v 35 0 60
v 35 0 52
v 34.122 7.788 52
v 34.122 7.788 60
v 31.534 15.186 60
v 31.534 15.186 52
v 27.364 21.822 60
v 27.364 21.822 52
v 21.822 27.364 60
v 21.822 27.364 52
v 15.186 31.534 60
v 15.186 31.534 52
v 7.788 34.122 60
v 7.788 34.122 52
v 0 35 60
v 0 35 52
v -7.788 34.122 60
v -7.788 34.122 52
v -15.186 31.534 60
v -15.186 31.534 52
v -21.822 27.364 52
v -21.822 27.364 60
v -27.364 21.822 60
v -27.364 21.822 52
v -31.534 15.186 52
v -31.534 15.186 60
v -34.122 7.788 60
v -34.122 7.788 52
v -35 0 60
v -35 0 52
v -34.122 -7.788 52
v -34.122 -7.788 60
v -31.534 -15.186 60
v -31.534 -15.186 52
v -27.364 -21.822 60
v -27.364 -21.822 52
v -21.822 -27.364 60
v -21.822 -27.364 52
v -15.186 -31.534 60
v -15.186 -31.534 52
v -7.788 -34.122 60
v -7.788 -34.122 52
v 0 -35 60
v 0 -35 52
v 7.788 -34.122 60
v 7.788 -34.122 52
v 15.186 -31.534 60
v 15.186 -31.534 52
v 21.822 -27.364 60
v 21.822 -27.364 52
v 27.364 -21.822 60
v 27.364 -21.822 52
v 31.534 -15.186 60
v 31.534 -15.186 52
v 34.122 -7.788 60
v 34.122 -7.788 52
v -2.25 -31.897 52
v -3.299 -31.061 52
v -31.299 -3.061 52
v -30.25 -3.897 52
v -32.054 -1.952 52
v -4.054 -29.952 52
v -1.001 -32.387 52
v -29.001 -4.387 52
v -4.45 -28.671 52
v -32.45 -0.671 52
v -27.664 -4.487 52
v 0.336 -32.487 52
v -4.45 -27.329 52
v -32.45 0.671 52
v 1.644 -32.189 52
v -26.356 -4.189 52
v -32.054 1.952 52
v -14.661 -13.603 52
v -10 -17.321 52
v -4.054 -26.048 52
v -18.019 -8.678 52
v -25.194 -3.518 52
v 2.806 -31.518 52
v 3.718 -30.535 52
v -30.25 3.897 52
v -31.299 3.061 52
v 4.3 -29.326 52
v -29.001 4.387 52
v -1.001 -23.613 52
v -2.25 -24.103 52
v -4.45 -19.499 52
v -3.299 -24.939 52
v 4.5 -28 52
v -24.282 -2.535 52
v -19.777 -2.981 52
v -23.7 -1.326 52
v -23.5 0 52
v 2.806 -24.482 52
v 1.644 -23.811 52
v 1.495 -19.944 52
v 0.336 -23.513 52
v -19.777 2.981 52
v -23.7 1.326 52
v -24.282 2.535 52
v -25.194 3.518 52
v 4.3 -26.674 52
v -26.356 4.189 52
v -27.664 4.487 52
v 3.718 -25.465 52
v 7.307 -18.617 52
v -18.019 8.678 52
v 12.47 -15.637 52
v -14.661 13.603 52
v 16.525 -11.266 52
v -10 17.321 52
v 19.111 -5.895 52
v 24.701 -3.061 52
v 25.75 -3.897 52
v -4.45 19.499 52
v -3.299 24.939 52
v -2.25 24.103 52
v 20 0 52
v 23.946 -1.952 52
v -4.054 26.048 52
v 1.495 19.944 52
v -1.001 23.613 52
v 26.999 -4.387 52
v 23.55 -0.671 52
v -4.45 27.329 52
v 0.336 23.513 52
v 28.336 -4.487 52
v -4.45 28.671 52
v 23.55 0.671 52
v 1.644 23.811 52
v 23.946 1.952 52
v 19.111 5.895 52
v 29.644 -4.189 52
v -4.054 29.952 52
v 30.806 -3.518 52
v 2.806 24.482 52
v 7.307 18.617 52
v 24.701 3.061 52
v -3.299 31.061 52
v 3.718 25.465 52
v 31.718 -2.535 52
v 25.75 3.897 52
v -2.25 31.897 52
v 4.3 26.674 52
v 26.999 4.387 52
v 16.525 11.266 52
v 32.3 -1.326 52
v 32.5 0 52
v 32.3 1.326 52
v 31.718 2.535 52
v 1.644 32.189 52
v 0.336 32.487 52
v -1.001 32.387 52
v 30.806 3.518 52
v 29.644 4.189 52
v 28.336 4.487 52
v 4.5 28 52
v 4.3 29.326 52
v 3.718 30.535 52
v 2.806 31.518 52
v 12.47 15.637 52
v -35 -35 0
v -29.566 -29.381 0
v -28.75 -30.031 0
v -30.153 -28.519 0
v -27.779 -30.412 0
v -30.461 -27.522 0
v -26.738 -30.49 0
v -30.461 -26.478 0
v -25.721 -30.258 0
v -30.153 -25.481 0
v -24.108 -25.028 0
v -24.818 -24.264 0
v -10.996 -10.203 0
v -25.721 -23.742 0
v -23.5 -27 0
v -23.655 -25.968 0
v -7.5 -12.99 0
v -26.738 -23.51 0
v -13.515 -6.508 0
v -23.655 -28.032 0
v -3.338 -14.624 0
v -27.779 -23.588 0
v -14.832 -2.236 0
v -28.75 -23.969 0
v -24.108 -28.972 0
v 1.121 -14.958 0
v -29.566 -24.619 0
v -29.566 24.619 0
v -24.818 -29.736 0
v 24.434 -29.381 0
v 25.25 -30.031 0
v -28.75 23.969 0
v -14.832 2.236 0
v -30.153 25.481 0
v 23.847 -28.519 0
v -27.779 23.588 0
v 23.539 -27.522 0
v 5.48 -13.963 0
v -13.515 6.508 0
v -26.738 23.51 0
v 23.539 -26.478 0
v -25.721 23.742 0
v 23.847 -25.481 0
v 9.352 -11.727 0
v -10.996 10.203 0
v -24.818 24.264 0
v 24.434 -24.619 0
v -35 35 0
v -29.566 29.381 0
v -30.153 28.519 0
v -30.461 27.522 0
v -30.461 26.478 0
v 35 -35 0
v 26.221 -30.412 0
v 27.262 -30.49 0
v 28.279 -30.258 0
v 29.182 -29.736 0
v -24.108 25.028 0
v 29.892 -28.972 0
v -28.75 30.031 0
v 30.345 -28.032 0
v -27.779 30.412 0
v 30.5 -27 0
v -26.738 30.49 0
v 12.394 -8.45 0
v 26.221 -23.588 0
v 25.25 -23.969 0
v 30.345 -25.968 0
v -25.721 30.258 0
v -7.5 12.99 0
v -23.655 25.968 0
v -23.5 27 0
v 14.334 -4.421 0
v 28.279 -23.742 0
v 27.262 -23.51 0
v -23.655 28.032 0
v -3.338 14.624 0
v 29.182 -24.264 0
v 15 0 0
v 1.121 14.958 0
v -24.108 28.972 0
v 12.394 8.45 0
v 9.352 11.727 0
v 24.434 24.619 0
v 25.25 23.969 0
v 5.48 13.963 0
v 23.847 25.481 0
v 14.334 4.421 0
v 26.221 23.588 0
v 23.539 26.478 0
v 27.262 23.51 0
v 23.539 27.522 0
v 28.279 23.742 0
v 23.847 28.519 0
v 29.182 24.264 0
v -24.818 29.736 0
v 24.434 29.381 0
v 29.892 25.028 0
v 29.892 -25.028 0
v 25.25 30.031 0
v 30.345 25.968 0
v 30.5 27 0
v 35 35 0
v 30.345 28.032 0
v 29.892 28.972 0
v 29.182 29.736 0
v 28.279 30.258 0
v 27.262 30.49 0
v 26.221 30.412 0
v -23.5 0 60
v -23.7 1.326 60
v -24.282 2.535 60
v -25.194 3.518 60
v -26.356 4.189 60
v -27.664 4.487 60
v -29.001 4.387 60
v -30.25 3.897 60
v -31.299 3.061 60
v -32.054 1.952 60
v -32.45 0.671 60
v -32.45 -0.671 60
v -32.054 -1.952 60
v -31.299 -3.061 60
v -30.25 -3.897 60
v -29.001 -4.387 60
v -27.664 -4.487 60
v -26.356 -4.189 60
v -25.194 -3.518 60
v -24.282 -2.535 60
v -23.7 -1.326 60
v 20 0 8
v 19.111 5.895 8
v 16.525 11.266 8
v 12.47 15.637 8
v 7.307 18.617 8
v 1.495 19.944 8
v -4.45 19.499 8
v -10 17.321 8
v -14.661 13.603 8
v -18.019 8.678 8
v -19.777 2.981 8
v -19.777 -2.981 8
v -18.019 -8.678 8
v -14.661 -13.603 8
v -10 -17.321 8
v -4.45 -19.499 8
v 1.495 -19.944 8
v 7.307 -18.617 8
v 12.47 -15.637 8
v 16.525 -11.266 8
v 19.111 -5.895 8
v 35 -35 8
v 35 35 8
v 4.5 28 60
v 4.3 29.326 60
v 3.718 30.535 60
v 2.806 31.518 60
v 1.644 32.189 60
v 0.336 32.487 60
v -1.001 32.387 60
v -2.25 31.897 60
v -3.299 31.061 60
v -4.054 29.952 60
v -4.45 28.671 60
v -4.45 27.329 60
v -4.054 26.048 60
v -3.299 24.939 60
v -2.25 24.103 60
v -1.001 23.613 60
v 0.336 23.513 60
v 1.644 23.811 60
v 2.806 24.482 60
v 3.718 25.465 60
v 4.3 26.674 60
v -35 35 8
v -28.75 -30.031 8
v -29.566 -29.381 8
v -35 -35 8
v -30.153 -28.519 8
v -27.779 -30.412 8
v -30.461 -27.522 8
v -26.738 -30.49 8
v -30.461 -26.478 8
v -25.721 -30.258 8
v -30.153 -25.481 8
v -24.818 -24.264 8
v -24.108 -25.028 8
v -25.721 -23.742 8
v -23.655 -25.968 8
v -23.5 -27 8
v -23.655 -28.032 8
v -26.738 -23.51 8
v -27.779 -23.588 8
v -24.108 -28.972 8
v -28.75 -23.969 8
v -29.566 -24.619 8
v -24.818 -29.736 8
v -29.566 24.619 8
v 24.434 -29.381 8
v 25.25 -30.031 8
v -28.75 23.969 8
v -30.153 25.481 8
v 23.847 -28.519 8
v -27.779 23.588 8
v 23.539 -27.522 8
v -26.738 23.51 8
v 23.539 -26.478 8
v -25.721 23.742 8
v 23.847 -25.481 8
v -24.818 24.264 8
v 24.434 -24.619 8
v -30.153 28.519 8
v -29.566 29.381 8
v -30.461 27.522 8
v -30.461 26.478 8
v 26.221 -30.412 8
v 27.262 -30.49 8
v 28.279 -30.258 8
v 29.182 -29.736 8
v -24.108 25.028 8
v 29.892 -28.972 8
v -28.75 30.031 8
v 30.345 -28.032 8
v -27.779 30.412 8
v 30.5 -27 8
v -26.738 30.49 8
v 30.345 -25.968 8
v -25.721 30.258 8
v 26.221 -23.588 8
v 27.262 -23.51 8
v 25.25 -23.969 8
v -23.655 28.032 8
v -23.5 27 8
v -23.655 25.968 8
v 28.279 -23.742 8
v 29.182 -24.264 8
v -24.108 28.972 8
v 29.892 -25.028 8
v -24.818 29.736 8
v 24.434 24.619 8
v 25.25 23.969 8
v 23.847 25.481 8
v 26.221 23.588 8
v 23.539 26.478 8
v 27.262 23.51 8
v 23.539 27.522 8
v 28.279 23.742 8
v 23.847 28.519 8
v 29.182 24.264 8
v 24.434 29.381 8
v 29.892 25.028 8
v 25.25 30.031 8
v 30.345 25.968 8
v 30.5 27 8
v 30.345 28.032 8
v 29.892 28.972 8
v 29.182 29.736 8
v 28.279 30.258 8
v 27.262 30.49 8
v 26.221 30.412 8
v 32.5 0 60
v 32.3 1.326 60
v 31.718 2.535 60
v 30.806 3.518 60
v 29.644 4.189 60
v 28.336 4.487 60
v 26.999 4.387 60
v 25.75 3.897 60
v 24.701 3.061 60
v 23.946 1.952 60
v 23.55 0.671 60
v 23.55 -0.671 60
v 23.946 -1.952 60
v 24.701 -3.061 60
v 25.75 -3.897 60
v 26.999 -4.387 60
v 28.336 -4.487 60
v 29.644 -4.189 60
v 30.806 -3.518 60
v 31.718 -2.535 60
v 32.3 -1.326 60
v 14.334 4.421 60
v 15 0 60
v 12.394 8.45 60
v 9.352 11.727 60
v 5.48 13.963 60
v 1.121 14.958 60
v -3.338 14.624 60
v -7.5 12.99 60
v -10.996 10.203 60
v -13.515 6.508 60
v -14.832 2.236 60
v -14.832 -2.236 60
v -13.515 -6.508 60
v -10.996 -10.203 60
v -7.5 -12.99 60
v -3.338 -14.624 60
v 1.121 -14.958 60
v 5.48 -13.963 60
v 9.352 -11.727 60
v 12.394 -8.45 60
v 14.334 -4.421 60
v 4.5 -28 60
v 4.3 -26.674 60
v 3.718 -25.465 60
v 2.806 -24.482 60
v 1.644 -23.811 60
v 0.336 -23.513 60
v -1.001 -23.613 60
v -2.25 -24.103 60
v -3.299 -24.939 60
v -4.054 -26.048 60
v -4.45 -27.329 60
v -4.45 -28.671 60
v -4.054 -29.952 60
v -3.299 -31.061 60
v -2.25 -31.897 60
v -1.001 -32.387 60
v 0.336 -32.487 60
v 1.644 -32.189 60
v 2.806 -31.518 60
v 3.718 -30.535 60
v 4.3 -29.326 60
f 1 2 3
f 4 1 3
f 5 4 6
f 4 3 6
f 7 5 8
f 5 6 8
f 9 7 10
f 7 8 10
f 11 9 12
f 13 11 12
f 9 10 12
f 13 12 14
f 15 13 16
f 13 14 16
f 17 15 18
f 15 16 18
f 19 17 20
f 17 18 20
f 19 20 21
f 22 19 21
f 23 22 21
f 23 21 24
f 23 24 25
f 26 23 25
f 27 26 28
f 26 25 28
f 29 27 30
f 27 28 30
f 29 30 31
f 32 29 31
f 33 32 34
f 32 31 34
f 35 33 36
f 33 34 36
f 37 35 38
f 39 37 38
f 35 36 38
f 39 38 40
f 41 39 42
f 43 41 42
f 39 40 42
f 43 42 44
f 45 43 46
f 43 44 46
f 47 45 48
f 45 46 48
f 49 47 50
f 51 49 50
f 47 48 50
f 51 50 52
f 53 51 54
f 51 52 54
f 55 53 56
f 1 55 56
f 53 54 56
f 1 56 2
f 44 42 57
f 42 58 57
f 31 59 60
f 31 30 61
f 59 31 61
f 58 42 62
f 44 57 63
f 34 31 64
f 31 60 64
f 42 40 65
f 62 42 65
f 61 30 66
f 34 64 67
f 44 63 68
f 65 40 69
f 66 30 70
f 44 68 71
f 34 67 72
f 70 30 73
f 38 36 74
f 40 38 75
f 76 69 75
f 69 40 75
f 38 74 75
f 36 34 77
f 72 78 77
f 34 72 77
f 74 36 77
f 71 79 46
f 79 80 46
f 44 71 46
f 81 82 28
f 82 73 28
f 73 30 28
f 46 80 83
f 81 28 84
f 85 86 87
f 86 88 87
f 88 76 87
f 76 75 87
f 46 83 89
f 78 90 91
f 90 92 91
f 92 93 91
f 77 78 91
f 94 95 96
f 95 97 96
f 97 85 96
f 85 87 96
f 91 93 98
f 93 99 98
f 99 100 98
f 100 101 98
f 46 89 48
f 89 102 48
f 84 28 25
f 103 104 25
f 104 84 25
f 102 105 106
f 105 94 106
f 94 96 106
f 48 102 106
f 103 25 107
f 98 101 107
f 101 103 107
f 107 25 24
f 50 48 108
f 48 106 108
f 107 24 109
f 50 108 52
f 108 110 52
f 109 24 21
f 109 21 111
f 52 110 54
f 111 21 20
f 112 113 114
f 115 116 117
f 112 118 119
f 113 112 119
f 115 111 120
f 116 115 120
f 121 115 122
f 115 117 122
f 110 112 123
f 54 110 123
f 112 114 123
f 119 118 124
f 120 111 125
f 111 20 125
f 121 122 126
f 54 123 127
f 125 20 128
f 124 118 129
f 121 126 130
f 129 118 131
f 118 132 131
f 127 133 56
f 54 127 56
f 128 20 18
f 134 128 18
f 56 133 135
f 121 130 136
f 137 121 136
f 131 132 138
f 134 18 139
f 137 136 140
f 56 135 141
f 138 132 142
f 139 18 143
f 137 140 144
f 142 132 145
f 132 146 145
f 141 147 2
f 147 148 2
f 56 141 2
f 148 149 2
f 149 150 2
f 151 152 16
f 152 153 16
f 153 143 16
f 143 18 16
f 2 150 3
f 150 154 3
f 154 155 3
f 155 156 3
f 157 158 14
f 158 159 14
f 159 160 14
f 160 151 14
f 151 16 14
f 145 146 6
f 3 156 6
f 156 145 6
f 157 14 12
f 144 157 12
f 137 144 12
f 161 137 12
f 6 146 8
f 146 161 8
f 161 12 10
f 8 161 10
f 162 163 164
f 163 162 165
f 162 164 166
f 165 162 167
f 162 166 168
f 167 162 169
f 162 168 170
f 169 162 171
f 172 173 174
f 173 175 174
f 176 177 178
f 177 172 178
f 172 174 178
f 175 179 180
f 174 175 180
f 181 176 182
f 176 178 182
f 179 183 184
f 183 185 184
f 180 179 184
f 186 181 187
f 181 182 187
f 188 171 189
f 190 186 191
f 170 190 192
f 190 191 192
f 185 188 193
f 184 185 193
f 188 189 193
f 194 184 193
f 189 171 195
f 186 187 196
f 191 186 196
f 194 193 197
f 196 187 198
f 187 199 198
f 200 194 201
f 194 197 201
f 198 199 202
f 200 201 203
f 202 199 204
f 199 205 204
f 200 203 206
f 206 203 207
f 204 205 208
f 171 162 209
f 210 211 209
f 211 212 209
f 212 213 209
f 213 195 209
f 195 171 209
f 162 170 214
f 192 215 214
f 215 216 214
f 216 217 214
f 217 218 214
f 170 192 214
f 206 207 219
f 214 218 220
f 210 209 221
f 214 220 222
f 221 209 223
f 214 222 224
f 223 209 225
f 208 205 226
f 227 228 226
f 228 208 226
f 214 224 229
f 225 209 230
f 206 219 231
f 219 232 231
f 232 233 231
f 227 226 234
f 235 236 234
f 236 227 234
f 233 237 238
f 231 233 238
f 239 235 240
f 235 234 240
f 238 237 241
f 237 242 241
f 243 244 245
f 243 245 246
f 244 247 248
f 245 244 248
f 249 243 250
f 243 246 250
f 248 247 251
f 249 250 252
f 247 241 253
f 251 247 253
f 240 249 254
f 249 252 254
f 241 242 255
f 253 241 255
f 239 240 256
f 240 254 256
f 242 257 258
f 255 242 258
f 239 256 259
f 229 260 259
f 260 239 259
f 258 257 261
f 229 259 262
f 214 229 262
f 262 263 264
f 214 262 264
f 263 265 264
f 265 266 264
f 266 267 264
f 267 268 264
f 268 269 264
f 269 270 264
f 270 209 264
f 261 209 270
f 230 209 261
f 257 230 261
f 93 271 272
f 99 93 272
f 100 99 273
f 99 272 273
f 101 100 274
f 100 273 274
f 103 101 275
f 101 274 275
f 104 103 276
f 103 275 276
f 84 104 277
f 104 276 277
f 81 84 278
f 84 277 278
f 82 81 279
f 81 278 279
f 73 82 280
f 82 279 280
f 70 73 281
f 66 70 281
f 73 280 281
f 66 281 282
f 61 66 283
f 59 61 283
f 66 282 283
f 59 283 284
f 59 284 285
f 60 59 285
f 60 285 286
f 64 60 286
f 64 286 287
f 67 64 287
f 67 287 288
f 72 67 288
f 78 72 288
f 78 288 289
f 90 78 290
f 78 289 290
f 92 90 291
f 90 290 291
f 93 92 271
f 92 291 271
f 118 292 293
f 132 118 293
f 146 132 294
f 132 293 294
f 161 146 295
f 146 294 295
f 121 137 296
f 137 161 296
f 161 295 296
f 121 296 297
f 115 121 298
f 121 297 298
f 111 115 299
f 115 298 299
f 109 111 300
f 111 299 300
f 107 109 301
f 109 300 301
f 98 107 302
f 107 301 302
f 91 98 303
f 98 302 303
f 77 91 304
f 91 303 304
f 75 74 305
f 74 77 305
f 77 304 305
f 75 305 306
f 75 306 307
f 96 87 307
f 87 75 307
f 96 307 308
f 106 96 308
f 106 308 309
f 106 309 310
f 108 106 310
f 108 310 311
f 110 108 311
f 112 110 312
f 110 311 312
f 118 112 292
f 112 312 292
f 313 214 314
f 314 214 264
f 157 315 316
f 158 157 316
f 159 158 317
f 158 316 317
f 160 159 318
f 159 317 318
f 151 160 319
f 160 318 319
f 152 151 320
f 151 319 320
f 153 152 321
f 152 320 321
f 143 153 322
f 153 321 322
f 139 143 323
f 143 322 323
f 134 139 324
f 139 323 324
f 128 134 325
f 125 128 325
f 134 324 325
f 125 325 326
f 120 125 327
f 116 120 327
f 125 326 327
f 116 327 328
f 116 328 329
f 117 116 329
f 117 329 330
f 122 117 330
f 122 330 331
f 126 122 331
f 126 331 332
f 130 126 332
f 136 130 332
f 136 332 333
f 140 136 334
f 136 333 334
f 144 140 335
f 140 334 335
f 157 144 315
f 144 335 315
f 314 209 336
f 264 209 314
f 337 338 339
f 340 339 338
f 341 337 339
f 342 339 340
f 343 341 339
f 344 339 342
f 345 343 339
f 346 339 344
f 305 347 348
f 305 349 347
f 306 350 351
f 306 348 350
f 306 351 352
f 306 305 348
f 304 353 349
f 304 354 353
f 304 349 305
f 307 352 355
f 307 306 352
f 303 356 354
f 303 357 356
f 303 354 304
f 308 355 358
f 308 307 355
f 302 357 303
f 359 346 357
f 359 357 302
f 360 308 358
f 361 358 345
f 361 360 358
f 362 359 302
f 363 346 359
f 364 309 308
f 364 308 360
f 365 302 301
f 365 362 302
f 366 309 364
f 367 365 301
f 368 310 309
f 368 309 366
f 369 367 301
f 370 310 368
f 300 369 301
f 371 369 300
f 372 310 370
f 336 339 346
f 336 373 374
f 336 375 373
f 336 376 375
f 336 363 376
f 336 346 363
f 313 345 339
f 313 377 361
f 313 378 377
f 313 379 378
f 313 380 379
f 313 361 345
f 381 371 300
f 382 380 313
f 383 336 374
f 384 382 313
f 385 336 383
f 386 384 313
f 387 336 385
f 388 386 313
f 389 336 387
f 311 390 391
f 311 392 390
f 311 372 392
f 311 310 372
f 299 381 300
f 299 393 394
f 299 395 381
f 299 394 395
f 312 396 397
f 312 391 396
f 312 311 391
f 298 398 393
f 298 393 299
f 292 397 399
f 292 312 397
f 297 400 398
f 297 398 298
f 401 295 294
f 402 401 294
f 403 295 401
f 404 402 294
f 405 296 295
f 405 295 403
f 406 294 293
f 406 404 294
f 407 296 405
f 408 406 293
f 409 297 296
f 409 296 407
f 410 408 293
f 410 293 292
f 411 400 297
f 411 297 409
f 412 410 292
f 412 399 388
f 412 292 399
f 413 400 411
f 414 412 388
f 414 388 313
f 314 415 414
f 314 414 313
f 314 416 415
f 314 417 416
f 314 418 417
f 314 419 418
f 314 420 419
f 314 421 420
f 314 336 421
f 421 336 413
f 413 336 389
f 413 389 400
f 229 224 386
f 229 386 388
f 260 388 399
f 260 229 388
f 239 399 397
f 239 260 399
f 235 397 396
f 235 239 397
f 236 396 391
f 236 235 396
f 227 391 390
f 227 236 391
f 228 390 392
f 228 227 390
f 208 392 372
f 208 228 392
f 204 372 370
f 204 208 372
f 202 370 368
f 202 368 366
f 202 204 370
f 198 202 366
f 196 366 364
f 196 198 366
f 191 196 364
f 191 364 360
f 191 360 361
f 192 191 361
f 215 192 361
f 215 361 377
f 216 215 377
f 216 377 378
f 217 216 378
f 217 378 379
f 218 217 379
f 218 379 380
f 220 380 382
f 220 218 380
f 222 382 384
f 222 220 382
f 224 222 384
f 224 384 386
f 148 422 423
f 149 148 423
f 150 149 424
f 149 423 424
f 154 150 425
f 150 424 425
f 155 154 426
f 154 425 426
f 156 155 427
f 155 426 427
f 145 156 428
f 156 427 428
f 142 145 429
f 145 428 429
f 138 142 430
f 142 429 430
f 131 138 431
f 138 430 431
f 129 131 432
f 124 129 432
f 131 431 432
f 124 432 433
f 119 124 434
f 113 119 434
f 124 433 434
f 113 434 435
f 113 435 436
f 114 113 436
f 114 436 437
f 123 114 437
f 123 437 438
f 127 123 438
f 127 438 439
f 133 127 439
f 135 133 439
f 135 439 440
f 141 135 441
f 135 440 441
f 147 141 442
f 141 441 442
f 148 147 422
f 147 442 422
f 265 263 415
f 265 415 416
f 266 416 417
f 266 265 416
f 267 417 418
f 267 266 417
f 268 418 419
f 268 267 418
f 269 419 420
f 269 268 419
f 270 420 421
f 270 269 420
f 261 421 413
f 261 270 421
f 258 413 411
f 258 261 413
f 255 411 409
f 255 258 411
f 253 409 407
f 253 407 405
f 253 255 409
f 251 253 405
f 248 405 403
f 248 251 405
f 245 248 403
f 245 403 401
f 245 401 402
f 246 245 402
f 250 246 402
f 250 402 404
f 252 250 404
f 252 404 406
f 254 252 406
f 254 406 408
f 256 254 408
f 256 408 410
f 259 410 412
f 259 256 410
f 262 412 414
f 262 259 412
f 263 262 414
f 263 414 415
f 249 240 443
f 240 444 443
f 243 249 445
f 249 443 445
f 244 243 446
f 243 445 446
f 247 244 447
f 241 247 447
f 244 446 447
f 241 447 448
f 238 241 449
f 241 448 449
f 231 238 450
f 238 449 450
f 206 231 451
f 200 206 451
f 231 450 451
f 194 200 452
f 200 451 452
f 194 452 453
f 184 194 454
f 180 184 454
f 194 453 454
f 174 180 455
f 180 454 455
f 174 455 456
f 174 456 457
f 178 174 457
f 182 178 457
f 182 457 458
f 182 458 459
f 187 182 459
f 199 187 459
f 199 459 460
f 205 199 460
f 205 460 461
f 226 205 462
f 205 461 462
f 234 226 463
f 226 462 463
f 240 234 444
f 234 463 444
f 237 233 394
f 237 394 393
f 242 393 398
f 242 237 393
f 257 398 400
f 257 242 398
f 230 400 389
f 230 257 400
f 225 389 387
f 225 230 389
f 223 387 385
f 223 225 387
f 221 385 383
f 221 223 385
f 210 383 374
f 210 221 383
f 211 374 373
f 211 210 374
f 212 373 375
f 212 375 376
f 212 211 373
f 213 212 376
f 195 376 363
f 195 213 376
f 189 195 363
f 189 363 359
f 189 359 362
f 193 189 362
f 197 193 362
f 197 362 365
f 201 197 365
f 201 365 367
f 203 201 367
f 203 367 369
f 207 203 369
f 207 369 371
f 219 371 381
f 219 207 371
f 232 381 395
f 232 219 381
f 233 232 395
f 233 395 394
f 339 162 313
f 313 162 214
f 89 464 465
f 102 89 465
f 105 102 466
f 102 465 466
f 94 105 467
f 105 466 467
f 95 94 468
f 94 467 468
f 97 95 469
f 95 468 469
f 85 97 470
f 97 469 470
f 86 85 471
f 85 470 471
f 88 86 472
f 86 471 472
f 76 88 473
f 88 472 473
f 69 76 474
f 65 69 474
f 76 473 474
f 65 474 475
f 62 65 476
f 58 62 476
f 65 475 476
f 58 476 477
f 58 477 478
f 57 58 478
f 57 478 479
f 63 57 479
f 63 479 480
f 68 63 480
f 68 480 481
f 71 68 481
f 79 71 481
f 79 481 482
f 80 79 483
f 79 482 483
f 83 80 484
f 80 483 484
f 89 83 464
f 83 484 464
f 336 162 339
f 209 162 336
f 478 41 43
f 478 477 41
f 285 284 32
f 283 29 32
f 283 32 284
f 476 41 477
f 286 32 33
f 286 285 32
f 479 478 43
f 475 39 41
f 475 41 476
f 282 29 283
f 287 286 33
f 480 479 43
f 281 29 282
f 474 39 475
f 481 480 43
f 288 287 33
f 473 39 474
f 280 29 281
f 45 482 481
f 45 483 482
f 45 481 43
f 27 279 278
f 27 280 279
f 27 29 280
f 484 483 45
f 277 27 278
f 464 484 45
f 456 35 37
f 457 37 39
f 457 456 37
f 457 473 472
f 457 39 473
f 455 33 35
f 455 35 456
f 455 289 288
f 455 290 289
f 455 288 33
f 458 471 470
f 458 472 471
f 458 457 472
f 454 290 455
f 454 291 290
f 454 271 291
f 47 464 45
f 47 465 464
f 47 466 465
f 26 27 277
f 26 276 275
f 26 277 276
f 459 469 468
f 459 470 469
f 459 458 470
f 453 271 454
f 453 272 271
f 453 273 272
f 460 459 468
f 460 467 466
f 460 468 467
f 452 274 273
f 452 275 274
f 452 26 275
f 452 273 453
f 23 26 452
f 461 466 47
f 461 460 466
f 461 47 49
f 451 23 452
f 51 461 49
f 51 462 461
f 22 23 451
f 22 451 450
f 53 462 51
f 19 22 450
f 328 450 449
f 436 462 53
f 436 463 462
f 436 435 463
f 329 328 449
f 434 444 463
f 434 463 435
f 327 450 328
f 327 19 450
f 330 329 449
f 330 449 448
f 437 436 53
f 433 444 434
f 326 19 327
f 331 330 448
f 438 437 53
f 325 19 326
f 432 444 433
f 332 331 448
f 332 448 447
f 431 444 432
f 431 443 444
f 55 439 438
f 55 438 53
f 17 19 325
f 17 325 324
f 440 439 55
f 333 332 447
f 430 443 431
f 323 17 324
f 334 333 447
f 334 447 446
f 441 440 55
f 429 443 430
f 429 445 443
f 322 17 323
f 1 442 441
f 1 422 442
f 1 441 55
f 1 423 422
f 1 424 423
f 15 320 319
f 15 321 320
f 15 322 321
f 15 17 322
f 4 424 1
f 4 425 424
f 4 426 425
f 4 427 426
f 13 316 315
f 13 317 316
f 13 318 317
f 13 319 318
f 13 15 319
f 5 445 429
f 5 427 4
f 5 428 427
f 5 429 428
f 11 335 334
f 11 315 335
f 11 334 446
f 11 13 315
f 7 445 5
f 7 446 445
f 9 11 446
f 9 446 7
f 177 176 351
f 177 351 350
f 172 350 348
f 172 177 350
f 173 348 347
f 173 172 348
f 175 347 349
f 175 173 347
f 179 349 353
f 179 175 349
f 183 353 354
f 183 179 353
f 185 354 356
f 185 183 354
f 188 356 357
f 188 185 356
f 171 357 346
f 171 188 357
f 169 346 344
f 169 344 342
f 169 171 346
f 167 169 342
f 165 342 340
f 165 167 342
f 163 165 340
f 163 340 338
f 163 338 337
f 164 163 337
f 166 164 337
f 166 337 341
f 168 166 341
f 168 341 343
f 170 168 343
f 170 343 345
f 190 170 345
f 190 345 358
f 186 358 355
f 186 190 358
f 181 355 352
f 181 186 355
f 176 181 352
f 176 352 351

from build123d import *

# Parameters (mm, degrees)
SKETCH_1_R          = 20
EXTRUDE_1_DEPTH     = 60
SKETCH_2_W          = 70
SKETCH_2_H          = 70
EXTRUDE_2_DEPTH     = 8
SKETCH_3_R          = 35
EXTRUDE_3_DEPTH     = 8
SKETCH_4_R          = 15
CUT_EXTRUDE_1_DEPTH = 71
SKETCH_5_R          = 3.5
CUT_EXTRUDE_2_DEPTH = 8
SKETCH_6_R          = 4.5
CUT_EXTRUDE_3_DEPTH = 8


with BuildPart() as part:
    # 草图1 → 凸台-拉伸1 (new body)
    with BuildSketch(Plane.XY):
        Circle(SKETCH_1_R)
    extrude(amount=EXTRUDE_1_DEPTH)

    # 草图2 → 凸台-拉伸2 (add)
    with BuildSketch(Plane.XY):
        Rectangle(SKETCH_2_W, SKETCH_2_H)
    extrude(amount=EXTRUDE_2_DEPTH)

    # 草图3 → 凸台-拉伸3 (add)
    with BuildSketch(Plane.XY.offset(52)):
        Circle(SKETCH_3_R)
    extrude(amount=EXTRUDE_3_DEPTH)

    # 草图4 → 切除-拉伸1 (cut, symmetric)
    with BuildSketch(Plane.XY):
        Circle(SKETCH_4_R)
    extrude(amount=CUT_EXTRUDE_1_DEPTH, both=True, mode=Mode.SUBTRACT)

    # 草图5 → 切除-拉伸2 (cut)
    with BuildSketch(Plane.XY):
        with Locations((27, 27)):
            Circle(SKETCH_5_R)
        with Locations((-27, 27)):
            Circle(SKETCH_5_R)
        with Locations((-27, -27)):
            Circle(SKETCH_5_R)
        with Locations((27, -27)):
            Circle(SKETCH_5_R)
    extrude(amount=CUT_EXTRUDE_2_DEPTH, mode=Mode.SUBTRACT)

    # 草图6 → 切除-拉伸3 (cut)
    with BuildSketch(Plane.XY.offset(60)):
        with Locations((28, 0)):
            Circle(SKETCH_6_R)
        with Locations((0, 28)):
            Circle(SKETCH_6_R)
        with Locations((-28, 0)):
            Circle(SKETCH_6_R)
        with Locations((0, -28)):
            Circle(SKETCH_6_R)
    extrude(amount=-CUT_EXTRUDE_3_DEPTH, mode=Mode.SUBTRACT)


solid = part.part
